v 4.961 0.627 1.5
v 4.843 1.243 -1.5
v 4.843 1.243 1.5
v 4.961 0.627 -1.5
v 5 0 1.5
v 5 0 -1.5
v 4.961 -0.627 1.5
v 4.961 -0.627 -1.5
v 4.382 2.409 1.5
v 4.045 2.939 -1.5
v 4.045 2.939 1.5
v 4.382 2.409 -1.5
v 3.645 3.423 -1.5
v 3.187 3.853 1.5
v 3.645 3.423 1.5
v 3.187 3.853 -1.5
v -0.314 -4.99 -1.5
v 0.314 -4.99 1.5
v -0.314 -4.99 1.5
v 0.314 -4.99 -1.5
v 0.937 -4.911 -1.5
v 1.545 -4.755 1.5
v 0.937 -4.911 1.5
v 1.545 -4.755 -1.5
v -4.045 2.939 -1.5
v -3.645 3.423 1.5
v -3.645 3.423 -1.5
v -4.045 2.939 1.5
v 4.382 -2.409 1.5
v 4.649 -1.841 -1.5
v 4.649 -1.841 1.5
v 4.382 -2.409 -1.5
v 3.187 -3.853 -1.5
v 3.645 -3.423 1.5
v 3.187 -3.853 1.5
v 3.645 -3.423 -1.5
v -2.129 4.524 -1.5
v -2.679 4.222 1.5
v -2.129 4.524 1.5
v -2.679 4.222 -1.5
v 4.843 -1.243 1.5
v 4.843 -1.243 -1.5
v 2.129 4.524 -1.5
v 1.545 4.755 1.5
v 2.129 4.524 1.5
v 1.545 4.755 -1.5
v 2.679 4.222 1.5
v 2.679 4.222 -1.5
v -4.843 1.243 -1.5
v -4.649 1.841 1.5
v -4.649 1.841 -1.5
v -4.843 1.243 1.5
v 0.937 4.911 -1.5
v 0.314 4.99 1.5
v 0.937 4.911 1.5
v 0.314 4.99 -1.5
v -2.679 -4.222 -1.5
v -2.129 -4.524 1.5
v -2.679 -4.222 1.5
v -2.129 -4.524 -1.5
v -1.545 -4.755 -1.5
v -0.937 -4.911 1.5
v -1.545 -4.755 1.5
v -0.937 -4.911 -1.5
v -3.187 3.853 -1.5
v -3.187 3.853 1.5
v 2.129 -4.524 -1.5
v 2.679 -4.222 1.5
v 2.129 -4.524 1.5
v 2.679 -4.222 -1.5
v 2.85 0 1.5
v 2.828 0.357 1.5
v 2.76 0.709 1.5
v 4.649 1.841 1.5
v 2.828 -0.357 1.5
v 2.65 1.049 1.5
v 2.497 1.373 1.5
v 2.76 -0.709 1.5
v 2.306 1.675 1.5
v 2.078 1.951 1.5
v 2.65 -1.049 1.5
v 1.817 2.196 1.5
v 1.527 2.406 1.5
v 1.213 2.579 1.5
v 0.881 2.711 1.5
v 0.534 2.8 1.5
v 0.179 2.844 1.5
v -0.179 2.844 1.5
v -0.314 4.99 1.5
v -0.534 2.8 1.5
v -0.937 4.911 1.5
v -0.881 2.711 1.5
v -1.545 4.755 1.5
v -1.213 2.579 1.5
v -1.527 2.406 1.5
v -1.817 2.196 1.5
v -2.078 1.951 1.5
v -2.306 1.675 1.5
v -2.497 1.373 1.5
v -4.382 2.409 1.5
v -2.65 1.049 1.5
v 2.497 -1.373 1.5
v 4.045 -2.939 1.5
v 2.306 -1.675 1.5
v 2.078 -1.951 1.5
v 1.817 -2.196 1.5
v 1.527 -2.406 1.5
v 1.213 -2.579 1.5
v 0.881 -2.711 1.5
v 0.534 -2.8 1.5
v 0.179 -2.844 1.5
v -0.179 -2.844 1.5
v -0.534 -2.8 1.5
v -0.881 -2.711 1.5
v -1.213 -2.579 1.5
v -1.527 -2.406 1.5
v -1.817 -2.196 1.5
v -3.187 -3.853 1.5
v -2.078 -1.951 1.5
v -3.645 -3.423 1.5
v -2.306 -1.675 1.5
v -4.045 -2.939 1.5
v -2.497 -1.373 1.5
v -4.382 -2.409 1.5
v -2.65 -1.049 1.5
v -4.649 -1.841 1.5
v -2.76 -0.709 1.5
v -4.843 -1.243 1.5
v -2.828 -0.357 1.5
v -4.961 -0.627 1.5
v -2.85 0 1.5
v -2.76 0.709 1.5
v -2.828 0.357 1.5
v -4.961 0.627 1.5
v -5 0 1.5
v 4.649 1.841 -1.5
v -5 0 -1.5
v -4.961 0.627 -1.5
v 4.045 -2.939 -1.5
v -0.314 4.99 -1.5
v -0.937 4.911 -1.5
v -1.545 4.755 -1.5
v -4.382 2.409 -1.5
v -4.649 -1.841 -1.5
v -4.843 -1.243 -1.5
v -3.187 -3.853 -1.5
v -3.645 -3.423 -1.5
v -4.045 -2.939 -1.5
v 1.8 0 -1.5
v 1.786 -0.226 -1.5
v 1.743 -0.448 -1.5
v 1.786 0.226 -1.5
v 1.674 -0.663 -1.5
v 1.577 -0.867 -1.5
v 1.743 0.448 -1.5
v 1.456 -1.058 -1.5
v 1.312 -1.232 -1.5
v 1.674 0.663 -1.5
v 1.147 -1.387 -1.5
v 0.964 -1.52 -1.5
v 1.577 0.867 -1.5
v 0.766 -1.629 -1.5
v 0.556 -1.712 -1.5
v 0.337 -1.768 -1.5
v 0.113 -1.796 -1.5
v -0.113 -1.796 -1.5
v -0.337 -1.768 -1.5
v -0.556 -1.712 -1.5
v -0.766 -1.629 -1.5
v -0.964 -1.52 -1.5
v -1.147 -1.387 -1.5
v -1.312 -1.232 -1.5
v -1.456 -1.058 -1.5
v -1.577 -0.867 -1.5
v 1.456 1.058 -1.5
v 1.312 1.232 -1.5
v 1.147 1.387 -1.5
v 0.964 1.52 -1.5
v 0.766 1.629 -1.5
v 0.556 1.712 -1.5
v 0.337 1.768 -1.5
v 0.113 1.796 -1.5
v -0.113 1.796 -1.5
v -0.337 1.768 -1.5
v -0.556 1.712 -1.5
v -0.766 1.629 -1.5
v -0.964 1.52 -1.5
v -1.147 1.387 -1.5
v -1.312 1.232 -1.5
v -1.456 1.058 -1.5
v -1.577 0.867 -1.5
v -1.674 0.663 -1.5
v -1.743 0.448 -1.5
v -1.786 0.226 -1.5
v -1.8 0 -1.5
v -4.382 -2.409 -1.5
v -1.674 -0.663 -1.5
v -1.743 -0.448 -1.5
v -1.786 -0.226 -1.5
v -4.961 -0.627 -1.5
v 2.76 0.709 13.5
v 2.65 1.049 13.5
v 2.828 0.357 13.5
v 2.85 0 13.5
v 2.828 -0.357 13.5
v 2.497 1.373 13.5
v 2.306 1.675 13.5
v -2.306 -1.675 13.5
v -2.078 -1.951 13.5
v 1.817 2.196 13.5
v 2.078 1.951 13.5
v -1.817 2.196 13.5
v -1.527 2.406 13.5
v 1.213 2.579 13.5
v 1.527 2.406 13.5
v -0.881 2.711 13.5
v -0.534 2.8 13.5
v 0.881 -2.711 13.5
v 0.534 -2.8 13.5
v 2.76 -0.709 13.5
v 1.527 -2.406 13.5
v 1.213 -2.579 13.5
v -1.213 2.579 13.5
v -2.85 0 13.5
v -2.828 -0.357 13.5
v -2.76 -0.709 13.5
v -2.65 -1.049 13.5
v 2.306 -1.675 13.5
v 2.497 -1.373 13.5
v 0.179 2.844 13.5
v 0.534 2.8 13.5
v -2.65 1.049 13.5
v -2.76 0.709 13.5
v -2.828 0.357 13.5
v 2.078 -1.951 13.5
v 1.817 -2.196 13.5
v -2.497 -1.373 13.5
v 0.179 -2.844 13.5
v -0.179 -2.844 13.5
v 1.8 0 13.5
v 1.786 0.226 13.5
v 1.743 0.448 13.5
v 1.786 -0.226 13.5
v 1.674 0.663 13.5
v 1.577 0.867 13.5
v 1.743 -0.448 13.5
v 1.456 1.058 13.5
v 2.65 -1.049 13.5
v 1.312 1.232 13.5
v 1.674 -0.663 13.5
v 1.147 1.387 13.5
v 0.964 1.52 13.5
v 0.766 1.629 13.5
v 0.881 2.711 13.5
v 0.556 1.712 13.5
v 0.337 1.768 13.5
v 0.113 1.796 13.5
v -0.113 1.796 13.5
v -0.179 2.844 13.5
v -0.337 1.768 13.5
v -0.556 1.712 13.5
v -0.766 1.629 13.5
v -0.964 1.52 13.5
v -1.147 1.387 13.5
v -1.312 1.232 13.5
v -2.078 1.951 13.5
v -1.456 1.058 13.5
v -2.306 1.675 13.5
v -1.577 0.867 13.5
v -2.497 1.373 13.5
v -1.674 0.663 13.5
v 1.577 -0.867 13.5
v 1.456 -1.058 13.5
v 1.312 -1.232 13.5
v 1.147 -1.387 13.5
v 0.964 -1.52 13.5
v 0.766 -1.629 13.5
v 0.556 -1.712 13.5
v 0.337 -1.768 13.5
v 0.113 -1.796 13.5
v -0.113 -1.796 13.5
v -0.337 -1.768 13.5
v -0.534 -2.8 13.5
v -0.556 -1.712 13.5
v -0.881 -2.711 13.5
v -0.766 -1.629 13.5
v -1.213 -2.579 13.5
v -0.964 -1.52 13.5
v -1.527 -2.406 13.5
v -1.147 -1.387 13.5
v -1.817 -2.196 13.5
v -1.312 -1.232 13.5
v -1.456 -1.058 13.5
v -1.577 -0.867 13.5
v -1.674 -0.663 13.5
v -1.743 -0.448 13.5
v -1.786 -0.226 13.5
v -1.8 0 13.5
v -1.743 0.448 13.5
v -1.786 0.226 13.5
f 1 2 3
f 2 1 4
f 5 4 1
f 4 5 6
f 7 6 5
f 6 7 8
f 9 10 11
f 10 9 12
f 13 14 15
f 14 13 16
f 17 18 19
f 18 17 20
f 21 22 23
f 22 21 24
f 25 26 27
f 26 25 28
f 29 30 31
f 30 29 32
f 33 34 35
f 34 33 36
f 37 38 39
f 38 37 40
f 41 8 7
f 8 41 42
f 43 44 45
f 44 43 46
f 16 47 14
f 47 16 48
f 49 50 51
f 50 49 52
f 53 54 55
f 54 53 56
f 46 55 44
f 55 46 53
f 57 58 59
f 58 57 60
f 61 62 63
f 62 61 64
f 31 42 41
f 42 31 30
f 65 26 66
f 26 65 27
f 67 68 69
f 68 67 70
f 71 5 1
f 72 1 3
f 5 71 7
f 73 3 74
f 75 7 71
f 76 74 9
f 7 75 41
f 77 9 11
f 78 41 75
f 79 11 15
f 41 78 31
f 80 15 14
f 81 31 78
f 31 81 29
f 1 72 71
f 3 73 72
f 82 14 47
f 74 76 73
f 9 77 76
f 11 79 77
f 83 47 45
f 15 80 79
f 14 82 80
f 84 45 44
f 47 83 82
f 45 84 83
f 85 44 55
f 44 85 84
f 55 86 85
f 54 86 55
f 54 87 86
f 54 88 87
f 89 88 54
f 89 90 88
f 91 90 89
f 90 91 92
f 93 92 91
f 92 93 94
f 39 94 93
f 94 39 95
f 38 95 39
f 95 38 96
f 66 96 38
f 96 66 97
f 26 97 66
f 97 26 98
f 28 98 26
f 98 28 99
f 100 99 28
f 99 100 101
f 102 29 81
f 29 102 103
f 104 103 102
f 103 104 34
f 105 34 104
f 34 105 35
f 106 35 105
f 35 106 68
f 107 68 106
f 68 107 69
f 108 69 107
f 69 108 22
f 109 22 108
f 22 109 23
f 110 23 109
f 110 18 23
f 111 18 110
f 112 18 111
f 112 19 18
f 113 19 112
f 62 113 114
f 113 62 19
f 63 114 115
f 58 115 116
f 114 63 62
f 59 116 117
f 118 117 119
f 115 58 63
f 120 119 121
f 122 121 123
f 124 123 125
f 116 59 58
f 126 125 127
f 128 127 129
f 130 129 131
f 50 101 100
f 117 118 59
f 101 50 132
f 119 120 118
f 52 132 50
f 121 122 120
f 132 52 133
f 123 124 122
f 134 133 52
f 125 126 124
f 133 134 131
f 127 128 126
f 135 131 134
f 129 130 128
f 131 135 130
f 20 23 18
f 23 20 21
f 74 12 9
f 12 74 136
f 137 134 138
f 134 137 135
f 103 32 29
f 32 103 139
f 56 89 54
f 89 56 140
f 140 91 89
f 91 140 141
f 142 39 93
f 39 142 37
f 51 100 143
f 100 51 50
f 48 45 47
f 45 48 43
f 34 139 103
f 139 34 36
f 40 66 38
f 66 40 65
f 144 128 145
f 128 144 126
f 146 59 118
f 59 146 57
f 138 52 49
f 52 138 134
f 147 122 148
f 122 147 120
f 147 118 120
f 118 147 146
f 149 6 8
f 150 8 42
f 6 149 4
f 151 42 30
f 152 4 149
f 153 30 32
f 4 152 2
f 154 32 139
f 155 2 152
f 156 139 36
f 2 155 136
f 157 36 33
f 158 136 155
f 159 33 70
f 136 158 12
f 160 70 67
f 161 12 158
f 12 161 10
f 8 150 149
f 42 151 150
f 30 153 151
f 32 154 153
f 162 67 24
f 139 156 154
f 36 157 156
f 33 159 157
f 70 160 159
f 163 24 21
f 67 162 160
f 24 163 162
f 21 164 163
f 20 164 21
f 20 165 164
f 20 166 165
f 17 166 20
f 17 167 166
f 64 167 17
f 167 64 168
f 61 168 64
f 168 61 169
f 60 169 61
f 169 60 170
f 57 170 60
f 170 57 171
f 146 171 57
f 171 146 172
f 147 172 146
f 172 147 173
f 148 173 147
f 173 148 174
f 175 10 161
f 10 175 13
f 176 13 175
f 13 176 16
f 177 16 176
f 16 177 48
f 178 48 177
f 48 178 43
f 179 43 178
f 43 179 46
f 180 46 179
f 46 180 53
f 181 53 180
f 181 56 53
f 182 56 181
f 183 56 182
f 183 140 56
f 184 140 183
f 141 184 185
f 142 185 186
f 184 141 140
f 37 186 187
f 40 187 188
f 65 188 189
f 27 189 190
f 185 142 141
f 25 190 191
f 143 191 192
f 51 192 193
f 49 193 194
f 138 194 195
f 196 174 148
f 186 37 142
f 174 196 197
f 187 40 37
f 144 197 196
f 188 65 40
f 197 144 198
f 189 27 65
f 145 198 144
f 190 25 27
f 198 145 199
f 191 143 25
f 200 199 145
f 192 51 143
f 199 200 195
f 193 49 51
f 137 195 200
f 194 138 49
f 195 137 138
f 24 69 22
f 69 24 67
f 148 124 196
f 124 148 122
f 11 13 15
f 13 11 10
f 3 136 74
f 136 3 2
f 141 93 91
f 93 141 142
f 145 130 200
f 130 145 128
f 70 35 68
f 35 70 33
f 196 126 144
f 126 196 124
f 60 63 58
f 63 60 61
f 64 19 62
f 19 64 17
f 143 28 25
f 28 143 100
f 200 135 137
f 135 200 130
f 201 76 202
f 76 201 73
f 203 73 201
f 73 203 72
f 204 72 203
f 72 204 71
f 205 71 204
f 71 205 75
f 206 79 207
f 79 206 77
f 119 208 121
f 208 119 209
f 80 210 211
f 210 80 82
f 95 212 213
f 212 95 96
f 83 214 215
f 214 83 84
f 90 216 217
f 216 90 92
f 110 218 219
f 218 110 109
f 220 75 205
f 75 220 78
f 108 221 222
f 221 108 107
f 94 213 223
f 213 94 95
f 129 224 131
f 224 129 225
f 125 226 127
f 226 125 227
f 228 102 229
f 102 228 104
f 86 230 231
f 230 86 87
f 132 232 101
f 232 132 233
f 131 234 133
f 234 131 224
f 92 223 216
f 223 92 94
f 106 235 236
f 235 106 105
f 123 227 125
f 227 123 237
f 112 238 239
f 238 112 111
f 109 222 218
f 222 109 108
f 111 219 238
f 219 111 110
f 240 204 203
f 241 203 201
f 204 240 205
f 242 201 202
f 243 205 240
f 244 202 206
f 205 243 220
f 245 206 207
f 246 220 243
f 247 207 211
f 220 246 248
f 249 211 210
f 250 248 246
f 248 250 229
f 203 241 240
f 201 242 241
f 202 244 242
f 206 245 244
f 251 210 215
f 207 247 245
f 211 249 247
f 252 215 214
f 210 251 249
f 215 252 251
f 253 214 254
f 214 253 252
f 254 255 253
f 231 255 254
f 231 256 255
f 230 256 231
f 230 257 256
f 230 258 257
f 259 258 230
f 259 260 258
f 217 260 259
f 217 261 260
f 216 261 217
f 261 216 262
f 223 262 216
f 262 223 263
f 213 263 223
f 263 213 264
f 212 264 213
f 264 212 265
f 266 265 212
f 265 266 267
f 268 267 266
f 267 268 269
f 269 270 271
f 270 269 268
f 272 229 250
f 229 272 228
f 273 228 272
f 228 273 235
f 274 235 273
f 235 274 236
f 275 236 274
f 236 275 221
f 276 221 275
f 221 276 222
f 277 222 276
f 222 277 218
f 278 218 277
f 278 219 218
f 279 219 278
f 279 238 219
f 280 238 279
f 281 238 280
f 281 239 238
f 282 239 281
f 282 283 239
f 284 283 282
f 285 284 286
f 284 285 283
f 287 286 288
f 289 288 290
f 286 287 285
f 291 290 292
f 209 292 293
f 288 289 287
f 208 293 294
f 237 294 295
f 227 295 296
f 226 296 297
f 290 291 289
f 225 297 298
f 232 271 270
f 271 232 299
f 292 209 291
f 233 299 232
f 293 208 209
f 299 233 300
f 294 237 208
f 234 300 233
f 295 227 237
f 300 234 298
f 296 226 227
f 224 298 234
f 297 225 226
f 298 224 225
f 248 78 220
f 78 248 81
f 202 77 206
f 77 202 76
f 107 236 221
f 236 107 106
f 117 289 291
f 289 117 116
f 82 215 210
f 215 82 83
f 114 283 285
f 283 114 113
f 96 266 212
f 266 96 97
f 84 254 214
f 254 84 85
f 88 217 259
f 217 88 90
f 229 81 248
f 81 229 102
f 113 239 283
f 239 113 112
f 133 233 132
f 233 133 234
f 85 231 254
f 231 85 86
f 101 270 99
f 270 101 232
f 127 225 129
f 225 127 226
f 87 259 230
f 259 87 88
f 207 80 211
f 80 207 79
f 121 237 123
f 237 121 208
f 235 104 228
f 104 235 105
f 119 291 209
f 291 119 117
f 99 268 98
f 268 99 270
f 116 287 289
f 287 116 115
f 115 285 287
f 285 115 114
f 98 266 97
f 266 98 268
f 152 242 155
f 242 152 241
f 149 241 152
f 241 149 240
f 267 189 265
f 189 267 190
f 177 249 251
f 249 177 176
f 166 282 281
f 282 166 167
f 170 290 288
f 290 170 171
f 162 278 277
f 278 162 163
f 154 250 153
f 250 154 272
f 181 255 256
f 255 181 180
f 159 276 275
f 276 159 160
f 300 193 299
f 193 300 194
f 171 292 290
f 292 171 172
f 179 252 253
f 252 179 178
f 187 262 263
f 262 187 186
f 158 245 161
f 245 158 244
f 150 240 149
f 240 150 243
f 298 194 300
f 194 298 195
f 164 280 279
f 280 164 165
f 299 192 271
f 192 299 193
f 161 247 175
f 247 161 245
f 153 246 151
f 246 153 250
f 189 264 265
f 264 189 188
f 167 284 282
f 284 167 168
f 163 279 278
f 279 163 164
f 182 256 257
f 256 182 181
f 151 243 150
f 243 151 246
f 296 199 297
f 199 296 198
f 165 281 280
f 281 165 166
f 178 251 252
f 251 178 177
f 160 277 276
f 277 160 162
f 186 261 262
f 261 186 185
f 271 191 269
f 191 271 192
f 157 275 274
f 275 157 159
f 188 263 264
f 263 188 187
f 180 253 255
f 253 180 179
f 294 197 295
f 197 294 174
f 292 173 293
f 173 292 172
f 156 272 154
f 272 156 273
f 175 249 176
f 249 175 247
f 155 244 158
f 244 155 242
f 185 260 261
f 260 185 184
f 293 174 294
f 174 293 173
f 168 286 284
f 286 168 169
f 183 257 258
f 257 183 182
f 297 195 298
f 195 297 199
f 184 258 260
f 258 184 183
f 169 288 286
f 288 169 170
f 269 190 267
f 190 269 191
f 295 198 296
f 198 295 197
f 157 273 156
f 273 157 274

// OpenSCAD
$fn = 50;


difference() {
	union() {
		translate(v = [0, 0, -1.5000000000]) {
			cylinder(h = 3, r = 5.0000000000);
		}
		translate(v = [0, 0, -1.5000000000]) {
			cylinder(h = 15, r = 2.8500000000);
		}
	}
	union() {
		translate(v = [0, 0, -100.0000000000]) {
			cylinder(h = 200, r = 1.8000000000);
		}
	}
}
